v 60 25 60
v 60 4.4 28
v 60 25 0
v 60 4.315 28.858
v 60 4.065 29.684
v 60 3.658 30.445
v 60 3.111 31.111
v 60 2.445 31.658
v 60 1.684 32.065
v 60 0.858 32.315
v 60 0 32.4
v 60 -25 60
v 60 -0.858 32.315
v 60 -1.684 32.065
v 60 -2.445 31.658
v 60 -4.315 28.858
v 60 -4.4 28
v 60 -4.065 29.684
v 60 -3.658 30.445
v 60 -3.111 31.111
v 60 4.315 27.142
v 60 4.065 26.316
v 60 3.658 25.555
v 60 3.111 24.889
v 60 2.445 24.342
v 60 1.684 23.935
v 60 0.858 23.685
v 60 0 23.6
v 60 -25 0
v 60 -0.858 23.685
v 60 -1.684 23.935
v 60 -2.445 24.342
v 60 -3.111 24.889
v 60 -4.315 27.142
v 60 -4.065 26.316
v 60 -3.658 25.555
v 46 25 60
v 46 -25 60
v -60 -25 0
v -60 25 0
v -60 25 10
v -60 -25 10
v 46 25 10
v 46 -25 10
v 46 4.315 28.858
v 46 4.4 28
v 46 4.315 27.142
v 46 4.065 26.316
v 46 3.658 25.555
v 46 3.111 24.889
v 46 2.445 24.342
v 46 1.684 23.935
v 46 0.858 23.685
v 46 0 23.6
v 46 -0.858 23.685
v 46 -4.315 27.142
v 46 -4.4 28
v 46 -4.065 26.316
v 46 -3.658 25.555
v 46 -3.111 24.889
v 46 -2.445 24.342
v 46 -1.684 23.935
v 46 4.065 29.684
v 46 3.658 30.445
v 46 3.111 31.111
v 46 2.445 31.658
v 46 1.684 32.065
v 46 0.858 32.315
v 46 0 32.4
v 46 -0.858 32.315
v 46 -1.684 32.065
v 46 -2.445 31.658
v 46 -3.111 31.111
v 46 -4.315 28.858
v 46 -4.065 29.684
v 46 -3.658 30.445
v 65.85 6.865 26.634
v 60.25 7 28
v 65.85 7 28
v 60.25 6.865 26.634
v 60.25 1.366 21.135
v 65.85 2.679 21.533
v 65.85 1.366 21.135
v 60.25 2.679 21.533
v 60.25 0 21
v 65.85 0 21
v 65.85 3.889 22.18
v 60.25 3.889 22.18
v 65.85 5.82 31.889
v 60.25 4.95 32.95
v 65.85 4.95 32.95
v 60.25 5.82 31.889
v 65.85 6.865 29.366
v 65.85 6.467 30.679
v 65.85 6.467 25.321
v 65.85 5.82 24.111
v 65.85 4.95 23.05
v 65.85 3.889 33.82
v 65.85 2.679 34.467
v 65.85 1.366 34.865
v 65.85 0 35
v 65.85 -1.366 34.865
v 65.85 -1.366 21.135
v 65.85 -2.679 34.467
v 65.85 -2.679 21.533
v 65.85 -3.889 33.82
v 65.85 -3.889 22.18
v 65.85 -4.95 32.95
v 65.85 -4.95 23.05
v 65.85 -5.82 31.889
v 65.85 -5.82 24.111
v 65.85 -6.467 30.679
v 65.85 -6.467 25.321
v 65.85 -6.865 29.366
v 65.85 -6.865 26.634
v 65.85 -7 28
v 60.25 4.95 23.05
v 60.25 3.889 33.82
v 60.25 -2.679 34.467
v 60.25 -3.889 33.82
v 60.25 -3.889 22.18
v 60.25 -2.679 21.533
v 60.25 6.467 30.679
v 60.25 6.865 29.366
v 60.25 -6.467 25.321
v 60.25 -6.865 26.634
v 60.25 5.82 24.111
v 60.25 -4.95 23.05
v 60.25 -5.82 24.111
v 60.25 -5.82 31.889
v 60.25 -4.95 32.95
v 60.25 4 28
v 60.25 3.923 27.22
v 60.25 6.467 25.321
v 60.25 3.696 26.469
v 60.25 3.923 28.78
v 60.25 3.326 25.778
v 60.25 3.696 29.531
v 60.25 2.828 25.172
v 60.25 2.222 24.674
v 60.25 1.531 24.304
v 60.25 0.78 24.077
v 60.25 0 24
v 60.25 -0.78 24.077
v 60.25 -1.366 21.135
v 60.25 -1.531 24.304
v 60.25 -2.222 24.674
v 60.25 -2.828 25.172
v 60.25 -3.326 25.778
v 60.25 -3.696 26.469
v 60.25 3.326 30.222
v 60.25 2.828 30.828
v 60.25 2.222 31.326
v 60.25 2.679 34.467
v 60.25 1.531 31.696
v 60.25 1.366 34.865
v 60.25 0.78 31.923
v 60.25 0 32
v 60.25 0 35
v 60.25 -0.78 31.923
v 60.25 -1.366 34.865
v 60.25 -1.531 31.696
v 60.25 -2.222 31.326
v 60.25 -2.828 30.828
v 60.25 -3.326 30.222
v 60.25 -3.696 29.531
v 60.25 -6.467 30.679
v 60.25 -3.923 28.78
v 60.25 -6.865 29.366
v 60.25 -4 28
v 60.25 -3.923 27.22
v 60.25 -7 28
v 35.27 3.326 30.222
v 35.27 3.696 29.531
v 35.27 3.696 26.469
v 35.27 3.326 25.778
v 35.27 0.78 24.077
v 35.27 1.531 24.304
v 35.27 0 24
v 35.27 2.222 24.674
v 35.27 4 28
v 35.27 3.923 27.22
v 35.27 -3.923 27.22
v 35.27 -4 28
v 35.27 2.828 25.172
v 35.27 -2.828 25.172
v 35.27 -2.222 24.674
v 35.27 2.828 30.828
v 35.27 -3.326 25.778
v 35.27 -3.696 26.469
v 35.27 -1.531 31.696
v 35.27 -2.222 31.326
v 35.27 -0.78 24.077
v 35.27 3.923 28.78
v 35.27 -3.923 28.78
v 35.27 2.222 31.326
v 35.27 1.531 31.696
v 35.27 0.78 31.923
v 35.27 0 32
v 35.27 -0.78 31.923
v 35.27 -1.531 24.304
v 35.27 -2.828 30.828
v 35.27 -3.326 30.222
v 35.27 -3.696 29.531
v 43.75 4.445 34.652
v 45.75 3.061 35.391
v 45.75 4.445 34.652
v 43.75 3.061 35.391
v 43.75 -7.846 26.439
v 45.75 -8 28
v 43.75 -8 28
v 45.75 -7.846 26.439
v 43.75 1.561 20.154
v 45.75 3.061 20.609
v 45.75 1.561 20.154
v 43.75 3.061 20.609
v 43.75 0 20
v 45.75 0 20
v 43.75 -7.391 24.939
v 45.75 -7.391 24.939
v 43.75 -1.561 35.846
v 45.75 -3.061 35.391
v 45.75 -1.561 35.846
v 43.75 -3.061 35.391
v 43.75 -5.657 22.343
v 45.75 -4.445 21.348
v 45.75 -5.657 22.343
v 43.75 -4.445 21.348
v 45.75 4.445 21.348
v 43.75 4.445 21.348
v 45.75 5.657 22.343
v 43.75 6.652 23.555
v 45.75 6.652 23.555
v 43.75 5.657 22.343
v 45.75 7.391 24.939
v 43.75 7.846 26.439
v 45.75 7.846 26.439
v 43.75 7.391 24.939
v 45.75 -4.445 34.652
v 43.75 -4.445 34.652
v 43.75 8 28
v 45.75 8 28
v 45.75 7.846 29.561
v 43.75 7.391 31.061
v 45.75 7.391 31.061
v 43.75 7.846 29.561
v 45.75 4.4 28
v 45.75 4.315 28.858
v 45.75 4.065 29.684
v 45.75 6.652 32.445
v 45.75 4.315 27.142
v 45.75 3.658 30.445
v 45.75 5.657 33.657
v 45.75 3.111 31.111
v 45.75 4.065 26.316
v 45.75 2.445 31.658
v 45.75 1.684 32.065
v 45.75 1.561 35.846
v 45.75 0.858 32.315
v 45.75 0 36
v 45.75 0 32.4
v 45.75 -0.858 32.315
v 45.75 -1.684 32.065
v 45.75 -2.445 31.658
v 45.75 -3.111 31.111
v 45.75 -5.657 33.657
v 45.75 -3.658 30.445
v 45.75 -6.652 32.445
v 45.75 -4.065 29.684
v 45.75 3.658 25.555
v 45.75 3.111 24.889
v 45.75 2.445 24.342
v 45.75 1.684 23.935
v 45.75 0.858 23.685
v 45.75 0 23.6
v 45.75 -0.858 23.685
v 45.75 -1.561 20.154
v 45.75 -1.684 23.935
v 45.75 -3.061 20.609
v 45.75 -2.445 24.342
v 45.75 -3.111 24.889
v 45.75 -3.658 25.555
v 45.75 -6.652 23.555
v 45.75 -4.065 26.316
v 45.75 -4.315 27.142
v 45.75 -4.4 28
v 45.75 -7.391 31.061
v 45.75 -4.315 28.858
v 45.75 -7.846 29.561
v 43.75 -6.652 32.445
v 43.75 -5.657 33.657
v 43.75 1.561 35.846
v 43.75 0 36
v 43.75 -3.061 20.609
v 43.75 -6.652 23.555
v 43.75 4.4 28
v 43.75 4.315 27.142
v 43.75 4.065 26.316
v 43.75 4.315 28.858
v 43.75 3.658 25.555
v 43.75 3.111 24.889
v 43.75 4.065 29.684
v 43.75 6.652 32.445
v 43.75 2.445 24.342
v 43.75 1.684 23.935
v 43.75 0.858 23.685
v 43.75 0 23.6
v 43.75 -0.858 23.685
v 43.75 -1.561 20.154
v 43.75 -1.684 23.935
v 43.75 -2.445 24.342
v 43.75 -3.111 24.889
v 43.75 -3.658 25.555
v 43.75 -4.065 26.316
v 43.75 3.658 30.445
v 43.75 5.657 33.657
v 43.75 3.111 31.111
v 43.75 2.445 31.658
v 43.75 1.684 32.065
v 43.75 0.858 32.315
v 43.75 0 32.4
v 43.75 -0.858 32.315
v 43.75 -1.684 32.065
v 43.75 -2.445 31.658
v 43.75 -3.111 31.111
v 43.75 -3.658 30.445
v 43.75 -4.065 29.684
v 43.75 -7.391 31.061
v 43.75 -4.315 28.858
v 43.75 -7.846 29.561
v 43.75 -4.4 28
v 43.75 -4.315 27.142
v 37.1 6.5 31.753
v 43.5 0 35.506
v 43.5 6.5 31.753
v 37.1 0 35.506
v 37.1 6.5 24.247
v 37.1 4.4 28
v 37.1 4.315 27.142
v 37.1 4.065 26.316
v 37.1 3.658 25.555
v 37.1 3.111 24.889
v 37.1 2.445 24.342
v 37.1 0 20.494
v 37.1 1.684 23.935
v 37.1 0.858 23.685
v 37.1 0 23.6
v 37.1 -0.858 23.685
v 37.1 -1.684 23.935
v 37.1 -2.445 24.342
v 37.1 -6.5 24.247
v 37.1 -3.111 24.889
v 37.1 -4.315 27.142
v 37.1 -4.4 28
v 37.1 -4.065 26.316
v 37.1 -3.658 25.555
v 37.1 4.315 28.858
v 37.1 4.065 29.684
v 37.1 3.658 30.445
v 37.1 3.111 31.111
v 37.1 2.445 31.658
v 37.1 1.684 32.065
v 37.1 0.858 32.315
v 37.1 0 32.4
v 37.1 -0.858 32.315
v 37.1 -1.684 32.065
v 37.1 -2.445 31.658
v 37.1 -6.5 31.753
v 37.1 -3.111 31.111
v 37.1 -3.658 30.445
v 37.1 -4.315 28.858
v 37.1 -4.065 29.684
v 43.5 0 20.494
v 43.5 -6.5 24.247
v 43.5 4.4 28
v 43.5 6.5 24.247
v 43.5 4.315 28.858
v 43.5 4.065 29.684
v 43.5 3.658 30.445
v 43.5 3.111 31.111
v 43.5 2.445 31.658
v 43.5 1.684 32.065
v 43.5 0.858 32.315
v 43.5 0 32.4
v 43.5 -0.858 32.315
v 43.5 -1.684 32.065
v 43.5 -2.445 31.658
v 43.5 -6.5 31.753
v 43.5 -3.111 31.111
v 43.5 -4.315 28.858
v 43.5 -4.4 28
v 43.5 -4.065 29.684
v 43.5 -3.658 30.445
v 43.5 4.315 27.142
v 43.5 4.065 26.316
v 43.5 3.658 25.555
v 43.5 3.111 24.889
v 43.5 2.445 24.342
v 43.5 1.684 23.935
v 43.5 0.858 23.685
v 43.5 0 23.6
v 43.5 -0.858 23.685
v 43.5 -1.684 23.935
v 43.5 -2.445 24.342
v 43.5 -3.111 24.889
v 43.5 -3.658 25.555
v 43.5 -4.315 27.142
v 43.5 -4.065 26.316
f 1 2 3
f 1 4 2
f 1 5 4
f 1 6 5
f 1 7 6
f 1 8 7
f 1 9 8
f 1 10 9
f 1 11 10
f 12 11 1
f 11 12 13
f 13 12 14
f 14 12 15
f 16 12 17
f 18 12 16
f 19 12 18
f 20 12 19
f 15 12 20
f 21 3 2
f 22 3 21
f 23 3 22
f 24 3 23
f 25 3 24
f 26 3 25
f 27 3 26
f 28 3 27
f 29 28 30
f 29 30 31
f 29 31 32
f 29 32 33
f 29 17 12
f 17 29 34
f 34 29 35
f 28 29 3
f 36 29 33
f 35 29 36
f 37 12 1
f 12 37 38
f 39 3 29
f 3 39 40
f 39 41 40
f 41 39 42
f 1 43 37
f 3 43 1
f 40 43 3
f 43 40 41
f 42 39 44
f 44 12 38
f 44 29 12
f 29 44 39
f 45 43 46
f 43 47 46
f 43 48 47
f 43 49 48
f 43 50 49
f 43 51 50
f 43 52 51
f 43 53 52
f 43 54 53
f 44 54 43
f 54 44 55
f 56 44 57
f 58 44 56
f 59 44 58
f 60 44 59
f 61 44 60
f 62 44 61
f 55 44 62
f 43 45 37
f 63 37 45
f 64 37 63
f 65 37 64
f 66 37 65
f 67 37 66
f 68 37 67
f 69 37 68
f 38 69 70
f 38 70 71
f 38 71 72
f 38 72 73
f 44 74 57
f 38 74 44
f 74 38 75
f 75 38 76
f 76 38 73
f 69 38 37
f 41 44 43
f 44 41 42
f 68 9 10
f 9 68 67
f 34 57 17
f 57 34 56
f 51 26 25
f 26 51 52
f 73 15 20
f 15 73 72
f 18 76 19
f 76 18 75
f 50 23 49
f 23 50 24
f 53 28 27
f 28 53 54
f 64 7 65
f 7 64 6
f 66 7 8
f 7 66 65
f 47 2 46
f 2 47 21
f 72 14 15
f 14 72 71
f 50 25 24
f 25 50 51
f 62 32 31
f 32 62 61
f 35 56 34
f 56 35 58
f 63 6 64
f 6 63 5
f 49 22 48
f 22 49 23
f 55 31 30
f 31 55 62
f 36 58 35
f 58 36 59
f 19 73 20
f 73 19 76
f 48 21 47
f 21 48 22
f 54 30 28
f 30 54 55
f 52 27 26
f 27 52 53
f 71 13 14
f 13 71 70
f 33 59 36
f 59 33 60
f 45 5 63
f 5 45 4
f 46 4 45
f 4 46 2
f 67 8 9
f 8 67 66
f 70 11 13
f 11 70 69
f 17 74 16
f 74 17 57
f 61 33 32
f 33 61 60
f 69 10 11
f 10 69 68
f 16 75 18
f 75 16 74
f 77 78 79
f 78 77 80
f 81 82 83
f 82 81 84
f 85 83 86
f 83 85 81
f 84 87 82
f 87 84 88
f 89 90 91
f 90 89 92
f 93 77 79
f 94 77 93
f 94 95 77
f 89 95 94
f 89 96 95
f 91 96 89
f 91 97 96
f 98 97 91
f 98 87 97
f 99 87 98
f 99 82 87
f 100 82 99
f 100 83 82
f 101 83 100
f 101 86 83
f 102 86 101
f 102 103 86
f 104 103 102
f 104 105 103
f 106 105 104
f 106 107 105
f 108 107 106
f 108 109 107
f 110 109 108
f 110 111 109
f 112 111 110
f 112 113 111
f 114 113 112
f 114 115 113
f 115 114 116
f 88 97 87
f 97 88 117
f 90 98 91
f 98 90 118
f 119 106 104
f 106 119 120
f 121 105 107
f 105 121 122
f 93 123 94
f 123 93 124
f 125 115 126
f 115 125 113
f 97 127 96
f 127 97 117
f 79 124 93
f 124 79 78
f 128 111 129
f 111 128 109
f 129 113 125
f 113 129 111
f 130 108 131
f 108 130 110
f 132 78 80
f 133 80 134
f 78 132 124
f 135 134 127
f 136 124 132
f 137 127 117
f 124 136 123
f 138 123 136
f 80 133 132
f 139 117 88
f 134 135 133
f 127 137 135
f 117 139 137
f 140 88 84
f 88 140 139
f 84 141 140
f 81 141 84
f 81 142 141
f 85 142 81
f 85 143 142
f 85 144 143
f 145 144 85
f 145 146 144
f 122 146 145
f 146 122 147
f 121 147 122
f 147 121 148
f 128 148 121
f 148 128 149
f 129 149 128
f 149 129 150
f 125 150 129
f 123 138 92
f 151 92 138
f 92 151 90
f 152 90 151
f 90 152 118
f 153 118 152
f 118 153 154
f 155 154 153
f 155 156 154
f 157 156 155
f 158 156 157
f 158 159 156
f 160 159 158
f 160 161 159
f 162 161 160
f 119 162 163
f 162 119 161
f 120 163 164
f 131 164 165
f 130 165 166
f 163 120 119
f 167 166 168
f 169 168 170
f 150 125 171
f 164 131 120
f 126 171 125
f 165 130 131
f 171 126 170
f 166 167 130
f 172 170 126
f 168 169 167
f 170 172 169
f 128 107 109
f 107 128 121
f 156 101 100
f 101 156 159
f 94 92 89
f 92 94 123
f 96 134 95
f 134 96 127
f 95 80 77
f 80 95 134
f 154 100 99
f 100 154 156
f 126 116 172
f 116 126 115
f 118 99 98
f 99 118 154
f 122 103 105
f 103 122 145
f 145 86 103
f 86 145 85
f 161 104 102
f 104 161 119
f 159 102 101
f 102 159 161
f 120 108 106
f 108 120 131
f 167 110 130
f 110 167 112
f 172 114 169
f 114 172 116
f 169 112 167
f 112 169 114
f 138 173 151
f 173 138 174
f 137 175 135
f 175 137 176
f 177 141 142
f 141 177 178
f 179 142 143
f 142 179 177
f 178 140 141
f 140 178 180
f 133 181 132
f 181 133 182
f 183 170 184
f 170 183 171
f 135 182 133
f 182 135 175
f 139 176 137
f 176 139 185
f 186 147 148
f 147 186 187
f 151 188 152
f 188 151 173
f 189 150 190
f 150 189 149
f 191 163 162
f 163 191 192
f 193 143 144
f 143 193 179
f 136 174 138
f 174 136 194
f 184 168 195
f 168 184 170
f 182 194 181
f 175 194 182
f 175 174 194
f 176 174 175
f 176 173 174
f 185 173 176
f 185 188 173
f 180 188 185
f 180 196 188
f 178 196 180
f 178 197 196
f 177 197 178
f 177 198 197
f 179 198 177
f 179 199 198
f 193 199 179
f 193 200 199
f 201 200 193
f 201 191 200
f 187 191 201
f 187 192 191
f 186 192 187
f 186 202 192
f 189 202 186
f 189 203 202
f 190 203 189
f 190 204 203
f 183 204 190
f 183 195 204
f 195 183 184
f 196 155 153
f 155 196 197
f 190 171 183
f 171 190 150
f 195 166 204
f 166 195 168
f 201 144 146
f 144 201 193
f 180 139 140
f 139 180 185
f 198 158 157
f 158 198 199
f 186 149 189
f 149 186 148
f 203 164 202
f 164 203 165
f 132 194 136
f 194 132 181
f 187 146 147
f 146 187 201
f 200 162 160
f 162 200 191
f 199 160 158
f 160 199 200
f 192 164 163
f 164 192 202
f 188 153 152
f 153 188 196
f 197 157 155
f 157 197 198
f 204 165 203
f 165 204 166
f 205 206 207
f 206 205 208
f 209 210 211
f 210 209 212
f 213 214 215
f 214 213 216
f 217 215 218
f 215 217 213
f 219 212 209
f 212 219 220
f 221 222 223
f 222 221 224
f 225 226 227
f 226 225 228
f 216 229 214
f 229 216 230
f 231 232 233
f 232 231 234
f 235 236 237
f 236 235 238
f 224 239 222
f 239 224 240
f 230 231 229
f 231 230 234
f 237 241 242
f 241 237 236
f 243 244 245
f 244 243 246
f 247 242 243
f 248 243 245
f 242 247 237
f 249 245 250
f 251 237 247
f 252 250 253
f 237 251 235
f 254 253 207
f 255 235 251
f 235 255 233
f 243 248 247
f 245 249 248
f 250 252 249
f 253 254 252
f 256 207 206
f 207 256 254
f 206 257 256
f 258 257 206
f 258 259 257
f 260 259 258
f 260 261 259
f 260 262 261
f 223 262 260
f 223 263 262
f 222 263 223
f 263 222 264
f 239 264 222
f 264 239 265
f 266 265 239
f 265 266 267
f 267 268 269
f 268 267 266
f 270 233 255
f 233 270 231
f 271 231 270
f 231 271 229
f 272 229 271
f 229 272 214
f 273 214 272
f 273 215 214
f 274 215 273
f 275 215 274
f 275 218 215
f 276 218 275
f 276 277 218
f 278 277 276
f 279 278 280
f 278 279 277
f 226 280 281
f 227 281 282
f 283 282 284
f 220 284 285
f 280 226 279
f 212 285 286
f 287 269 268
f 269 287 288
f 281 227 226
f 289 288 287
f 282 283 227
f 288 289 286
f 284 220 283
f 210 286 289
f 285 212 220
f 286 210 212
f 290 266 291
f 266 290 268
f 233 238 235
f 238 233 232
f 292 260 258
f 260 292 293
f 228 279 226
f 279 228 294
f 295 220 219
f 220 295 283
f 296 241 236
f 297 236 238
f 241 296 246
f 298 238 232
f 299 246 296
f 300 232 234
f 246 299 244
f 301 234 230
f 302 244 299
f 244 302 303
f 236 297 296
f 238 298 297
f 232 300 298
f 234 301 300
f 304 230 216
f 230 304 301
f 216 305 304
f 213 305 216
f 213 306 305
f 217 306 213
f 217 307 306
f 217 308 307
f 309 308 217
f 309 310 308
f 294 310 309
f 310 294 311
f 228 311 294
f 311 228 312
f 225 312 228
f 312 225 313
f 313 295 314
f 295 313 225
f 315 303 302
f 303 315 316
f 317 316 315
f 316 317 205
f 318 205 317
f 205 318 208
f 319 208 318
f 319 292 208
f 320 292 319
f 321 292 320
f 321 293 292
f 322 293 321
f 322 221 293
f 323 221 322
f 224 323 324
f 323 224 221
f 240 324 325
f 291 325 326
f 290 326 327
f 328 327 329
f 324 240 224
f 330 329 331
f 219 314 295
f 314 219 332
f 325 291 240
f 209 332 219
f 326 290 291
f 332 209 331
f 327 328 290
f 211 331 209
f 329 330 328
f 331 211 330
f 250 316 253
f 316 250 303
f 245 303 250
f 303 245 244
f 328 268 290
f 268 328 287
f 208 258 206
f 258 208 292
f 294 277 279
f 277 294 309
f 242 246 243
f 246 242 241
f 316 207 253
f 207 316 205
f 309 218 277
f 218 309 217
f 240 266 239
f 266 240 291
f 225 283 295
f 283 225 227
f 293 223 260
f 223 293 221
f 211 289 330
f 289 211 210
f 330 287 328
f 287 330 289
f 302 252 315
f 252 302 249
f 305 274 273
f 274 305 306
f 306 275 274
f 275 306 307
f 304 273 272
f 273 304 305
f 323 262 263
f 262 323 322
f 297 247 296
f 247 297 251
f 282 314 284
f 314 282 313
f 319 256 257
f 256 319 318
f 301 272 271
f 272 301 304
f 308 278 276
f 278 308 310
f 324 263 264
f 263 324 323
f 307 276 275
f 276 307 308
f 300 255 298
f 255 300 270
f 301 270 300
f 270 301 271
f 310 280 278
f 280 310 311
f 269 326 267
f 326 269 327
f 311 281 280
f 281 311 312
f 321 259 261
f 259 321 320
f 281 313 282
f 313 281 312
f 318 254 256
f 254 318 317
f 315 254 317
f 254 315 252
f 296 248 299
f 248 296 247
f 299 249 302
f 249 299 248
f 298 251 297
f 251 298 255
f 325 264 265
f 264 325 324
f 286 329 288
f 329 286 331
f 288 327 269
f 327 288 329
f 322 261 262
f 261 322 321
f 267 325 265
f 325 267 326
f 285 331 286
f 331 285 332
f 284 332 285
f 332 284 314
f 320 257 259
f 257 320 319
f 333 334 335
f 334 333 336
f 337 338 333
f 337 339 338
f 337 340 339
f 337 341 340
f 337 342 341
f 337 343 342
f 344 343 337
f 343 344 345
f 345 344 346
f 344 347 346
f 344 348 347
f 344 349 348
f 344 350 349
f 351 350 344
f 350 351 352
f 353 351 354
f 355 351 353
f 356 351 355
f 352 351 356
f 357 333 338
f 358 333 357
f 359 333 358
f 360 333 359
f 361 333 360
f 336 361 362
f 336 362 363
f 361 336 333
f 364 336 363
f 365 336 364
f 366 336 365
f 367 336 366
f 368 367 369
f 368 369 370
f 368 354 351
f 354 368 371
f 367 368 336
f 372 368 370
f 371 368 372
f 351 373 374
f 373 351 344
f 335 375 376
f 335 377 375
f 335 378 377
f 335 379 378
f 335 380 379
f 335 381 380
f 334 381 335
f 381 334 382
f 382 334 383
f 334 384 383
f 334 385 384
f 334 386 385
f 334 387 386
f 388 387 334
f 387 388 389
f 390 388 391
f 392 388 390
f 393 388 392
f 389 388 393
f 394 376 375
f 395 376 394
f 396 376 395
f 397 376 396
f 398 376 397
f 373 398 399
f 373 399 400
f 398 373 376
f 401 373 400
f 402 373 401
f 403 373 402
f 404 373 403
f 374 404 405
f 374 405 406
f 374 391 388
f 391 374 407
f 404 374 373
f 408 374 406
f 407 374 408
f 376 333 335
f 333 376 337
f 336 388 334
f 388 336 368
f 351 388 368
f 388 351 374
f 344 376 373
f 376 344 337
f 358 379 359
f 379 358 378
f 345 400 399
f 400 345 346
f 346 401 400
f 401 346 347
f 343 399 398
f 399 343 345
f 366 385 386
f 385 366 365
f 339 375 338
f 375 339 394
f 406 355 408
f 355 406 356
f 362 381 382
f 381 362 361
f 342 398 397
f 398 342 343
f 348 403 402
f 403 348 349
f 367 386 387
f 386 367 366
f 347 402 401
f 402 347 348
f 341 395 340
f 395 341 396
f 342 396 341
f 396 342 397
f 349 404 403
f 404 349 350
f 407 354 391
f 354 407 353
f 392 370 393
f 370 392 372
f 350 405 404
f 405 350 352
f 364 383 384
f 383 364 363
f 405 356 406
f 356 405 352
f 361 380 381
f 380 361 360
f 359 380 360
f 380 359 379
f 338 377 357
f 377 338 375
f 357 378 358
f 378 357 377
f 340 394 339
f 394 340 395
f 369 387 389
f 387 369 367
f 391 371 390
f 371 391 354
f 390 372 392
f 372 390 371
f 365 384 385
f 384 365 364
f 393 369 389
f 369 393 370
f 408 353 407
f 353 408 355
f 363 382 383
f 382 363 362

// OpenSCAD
$fn = 32;

// ------------------------------------------------------------------------
// Bolted bracket: 120 x 50 mm bracket with 1 bolt joints
// Every part is its own module, assembly() places them once.
// ------------------------------------------------------------------------

// --- part 1 ---
module bracket() {
  difference() {
    translate([-60, -25, 0]) cube([120, 50, 60]);
    translate([-61, -26, 10]) cube([107, 52, 51]);
    translate([53, 0, 28]) rotate([0, 90, 0]) cylinder(h = 16, d = 8.8, center = true);
  }
}

// --- part 2 ---
module bolt() {
  cylinder(h = 5.6, d = 14);
  translate([0, 0, -24.98]) cylinder(h = 24.98, d = 8);
}

// --- part 3 ---
module washer() {
  difference() {
      translate([0, 0, 0]) cylinder(h = 2, d = 16);
      translate([0, 0, -1]) cylinder(h = 4, d = 8.8);
    }
}

// --- part 4 ---
module nut() {
  difference() {
    linear_extrude(height = 6.4) polygon(points = [[7.506, 0], [3.753, 6.5], [-3.753, 6.5], [-7.506, 0], [-3.753, -6.5], [3.753, -6.5]]);
    translate([0, 0, -1]) cylinder(h = 8.4, d = 8.8);
  }
}

// --- assembly ---
module assembly() {
  translate([0, 0, 0]) rotate([0, 0, 0]) bracket();
  translate([60.25, 0, 28]) rotate([0, 90, 0]) bolt();
  translate([43.75, 0, 28]) rotate([0, 90, 0]) washer();
  translate([37.1, 0, 28]) rotate([0, 90, 0]) nut();
}

assembly();
